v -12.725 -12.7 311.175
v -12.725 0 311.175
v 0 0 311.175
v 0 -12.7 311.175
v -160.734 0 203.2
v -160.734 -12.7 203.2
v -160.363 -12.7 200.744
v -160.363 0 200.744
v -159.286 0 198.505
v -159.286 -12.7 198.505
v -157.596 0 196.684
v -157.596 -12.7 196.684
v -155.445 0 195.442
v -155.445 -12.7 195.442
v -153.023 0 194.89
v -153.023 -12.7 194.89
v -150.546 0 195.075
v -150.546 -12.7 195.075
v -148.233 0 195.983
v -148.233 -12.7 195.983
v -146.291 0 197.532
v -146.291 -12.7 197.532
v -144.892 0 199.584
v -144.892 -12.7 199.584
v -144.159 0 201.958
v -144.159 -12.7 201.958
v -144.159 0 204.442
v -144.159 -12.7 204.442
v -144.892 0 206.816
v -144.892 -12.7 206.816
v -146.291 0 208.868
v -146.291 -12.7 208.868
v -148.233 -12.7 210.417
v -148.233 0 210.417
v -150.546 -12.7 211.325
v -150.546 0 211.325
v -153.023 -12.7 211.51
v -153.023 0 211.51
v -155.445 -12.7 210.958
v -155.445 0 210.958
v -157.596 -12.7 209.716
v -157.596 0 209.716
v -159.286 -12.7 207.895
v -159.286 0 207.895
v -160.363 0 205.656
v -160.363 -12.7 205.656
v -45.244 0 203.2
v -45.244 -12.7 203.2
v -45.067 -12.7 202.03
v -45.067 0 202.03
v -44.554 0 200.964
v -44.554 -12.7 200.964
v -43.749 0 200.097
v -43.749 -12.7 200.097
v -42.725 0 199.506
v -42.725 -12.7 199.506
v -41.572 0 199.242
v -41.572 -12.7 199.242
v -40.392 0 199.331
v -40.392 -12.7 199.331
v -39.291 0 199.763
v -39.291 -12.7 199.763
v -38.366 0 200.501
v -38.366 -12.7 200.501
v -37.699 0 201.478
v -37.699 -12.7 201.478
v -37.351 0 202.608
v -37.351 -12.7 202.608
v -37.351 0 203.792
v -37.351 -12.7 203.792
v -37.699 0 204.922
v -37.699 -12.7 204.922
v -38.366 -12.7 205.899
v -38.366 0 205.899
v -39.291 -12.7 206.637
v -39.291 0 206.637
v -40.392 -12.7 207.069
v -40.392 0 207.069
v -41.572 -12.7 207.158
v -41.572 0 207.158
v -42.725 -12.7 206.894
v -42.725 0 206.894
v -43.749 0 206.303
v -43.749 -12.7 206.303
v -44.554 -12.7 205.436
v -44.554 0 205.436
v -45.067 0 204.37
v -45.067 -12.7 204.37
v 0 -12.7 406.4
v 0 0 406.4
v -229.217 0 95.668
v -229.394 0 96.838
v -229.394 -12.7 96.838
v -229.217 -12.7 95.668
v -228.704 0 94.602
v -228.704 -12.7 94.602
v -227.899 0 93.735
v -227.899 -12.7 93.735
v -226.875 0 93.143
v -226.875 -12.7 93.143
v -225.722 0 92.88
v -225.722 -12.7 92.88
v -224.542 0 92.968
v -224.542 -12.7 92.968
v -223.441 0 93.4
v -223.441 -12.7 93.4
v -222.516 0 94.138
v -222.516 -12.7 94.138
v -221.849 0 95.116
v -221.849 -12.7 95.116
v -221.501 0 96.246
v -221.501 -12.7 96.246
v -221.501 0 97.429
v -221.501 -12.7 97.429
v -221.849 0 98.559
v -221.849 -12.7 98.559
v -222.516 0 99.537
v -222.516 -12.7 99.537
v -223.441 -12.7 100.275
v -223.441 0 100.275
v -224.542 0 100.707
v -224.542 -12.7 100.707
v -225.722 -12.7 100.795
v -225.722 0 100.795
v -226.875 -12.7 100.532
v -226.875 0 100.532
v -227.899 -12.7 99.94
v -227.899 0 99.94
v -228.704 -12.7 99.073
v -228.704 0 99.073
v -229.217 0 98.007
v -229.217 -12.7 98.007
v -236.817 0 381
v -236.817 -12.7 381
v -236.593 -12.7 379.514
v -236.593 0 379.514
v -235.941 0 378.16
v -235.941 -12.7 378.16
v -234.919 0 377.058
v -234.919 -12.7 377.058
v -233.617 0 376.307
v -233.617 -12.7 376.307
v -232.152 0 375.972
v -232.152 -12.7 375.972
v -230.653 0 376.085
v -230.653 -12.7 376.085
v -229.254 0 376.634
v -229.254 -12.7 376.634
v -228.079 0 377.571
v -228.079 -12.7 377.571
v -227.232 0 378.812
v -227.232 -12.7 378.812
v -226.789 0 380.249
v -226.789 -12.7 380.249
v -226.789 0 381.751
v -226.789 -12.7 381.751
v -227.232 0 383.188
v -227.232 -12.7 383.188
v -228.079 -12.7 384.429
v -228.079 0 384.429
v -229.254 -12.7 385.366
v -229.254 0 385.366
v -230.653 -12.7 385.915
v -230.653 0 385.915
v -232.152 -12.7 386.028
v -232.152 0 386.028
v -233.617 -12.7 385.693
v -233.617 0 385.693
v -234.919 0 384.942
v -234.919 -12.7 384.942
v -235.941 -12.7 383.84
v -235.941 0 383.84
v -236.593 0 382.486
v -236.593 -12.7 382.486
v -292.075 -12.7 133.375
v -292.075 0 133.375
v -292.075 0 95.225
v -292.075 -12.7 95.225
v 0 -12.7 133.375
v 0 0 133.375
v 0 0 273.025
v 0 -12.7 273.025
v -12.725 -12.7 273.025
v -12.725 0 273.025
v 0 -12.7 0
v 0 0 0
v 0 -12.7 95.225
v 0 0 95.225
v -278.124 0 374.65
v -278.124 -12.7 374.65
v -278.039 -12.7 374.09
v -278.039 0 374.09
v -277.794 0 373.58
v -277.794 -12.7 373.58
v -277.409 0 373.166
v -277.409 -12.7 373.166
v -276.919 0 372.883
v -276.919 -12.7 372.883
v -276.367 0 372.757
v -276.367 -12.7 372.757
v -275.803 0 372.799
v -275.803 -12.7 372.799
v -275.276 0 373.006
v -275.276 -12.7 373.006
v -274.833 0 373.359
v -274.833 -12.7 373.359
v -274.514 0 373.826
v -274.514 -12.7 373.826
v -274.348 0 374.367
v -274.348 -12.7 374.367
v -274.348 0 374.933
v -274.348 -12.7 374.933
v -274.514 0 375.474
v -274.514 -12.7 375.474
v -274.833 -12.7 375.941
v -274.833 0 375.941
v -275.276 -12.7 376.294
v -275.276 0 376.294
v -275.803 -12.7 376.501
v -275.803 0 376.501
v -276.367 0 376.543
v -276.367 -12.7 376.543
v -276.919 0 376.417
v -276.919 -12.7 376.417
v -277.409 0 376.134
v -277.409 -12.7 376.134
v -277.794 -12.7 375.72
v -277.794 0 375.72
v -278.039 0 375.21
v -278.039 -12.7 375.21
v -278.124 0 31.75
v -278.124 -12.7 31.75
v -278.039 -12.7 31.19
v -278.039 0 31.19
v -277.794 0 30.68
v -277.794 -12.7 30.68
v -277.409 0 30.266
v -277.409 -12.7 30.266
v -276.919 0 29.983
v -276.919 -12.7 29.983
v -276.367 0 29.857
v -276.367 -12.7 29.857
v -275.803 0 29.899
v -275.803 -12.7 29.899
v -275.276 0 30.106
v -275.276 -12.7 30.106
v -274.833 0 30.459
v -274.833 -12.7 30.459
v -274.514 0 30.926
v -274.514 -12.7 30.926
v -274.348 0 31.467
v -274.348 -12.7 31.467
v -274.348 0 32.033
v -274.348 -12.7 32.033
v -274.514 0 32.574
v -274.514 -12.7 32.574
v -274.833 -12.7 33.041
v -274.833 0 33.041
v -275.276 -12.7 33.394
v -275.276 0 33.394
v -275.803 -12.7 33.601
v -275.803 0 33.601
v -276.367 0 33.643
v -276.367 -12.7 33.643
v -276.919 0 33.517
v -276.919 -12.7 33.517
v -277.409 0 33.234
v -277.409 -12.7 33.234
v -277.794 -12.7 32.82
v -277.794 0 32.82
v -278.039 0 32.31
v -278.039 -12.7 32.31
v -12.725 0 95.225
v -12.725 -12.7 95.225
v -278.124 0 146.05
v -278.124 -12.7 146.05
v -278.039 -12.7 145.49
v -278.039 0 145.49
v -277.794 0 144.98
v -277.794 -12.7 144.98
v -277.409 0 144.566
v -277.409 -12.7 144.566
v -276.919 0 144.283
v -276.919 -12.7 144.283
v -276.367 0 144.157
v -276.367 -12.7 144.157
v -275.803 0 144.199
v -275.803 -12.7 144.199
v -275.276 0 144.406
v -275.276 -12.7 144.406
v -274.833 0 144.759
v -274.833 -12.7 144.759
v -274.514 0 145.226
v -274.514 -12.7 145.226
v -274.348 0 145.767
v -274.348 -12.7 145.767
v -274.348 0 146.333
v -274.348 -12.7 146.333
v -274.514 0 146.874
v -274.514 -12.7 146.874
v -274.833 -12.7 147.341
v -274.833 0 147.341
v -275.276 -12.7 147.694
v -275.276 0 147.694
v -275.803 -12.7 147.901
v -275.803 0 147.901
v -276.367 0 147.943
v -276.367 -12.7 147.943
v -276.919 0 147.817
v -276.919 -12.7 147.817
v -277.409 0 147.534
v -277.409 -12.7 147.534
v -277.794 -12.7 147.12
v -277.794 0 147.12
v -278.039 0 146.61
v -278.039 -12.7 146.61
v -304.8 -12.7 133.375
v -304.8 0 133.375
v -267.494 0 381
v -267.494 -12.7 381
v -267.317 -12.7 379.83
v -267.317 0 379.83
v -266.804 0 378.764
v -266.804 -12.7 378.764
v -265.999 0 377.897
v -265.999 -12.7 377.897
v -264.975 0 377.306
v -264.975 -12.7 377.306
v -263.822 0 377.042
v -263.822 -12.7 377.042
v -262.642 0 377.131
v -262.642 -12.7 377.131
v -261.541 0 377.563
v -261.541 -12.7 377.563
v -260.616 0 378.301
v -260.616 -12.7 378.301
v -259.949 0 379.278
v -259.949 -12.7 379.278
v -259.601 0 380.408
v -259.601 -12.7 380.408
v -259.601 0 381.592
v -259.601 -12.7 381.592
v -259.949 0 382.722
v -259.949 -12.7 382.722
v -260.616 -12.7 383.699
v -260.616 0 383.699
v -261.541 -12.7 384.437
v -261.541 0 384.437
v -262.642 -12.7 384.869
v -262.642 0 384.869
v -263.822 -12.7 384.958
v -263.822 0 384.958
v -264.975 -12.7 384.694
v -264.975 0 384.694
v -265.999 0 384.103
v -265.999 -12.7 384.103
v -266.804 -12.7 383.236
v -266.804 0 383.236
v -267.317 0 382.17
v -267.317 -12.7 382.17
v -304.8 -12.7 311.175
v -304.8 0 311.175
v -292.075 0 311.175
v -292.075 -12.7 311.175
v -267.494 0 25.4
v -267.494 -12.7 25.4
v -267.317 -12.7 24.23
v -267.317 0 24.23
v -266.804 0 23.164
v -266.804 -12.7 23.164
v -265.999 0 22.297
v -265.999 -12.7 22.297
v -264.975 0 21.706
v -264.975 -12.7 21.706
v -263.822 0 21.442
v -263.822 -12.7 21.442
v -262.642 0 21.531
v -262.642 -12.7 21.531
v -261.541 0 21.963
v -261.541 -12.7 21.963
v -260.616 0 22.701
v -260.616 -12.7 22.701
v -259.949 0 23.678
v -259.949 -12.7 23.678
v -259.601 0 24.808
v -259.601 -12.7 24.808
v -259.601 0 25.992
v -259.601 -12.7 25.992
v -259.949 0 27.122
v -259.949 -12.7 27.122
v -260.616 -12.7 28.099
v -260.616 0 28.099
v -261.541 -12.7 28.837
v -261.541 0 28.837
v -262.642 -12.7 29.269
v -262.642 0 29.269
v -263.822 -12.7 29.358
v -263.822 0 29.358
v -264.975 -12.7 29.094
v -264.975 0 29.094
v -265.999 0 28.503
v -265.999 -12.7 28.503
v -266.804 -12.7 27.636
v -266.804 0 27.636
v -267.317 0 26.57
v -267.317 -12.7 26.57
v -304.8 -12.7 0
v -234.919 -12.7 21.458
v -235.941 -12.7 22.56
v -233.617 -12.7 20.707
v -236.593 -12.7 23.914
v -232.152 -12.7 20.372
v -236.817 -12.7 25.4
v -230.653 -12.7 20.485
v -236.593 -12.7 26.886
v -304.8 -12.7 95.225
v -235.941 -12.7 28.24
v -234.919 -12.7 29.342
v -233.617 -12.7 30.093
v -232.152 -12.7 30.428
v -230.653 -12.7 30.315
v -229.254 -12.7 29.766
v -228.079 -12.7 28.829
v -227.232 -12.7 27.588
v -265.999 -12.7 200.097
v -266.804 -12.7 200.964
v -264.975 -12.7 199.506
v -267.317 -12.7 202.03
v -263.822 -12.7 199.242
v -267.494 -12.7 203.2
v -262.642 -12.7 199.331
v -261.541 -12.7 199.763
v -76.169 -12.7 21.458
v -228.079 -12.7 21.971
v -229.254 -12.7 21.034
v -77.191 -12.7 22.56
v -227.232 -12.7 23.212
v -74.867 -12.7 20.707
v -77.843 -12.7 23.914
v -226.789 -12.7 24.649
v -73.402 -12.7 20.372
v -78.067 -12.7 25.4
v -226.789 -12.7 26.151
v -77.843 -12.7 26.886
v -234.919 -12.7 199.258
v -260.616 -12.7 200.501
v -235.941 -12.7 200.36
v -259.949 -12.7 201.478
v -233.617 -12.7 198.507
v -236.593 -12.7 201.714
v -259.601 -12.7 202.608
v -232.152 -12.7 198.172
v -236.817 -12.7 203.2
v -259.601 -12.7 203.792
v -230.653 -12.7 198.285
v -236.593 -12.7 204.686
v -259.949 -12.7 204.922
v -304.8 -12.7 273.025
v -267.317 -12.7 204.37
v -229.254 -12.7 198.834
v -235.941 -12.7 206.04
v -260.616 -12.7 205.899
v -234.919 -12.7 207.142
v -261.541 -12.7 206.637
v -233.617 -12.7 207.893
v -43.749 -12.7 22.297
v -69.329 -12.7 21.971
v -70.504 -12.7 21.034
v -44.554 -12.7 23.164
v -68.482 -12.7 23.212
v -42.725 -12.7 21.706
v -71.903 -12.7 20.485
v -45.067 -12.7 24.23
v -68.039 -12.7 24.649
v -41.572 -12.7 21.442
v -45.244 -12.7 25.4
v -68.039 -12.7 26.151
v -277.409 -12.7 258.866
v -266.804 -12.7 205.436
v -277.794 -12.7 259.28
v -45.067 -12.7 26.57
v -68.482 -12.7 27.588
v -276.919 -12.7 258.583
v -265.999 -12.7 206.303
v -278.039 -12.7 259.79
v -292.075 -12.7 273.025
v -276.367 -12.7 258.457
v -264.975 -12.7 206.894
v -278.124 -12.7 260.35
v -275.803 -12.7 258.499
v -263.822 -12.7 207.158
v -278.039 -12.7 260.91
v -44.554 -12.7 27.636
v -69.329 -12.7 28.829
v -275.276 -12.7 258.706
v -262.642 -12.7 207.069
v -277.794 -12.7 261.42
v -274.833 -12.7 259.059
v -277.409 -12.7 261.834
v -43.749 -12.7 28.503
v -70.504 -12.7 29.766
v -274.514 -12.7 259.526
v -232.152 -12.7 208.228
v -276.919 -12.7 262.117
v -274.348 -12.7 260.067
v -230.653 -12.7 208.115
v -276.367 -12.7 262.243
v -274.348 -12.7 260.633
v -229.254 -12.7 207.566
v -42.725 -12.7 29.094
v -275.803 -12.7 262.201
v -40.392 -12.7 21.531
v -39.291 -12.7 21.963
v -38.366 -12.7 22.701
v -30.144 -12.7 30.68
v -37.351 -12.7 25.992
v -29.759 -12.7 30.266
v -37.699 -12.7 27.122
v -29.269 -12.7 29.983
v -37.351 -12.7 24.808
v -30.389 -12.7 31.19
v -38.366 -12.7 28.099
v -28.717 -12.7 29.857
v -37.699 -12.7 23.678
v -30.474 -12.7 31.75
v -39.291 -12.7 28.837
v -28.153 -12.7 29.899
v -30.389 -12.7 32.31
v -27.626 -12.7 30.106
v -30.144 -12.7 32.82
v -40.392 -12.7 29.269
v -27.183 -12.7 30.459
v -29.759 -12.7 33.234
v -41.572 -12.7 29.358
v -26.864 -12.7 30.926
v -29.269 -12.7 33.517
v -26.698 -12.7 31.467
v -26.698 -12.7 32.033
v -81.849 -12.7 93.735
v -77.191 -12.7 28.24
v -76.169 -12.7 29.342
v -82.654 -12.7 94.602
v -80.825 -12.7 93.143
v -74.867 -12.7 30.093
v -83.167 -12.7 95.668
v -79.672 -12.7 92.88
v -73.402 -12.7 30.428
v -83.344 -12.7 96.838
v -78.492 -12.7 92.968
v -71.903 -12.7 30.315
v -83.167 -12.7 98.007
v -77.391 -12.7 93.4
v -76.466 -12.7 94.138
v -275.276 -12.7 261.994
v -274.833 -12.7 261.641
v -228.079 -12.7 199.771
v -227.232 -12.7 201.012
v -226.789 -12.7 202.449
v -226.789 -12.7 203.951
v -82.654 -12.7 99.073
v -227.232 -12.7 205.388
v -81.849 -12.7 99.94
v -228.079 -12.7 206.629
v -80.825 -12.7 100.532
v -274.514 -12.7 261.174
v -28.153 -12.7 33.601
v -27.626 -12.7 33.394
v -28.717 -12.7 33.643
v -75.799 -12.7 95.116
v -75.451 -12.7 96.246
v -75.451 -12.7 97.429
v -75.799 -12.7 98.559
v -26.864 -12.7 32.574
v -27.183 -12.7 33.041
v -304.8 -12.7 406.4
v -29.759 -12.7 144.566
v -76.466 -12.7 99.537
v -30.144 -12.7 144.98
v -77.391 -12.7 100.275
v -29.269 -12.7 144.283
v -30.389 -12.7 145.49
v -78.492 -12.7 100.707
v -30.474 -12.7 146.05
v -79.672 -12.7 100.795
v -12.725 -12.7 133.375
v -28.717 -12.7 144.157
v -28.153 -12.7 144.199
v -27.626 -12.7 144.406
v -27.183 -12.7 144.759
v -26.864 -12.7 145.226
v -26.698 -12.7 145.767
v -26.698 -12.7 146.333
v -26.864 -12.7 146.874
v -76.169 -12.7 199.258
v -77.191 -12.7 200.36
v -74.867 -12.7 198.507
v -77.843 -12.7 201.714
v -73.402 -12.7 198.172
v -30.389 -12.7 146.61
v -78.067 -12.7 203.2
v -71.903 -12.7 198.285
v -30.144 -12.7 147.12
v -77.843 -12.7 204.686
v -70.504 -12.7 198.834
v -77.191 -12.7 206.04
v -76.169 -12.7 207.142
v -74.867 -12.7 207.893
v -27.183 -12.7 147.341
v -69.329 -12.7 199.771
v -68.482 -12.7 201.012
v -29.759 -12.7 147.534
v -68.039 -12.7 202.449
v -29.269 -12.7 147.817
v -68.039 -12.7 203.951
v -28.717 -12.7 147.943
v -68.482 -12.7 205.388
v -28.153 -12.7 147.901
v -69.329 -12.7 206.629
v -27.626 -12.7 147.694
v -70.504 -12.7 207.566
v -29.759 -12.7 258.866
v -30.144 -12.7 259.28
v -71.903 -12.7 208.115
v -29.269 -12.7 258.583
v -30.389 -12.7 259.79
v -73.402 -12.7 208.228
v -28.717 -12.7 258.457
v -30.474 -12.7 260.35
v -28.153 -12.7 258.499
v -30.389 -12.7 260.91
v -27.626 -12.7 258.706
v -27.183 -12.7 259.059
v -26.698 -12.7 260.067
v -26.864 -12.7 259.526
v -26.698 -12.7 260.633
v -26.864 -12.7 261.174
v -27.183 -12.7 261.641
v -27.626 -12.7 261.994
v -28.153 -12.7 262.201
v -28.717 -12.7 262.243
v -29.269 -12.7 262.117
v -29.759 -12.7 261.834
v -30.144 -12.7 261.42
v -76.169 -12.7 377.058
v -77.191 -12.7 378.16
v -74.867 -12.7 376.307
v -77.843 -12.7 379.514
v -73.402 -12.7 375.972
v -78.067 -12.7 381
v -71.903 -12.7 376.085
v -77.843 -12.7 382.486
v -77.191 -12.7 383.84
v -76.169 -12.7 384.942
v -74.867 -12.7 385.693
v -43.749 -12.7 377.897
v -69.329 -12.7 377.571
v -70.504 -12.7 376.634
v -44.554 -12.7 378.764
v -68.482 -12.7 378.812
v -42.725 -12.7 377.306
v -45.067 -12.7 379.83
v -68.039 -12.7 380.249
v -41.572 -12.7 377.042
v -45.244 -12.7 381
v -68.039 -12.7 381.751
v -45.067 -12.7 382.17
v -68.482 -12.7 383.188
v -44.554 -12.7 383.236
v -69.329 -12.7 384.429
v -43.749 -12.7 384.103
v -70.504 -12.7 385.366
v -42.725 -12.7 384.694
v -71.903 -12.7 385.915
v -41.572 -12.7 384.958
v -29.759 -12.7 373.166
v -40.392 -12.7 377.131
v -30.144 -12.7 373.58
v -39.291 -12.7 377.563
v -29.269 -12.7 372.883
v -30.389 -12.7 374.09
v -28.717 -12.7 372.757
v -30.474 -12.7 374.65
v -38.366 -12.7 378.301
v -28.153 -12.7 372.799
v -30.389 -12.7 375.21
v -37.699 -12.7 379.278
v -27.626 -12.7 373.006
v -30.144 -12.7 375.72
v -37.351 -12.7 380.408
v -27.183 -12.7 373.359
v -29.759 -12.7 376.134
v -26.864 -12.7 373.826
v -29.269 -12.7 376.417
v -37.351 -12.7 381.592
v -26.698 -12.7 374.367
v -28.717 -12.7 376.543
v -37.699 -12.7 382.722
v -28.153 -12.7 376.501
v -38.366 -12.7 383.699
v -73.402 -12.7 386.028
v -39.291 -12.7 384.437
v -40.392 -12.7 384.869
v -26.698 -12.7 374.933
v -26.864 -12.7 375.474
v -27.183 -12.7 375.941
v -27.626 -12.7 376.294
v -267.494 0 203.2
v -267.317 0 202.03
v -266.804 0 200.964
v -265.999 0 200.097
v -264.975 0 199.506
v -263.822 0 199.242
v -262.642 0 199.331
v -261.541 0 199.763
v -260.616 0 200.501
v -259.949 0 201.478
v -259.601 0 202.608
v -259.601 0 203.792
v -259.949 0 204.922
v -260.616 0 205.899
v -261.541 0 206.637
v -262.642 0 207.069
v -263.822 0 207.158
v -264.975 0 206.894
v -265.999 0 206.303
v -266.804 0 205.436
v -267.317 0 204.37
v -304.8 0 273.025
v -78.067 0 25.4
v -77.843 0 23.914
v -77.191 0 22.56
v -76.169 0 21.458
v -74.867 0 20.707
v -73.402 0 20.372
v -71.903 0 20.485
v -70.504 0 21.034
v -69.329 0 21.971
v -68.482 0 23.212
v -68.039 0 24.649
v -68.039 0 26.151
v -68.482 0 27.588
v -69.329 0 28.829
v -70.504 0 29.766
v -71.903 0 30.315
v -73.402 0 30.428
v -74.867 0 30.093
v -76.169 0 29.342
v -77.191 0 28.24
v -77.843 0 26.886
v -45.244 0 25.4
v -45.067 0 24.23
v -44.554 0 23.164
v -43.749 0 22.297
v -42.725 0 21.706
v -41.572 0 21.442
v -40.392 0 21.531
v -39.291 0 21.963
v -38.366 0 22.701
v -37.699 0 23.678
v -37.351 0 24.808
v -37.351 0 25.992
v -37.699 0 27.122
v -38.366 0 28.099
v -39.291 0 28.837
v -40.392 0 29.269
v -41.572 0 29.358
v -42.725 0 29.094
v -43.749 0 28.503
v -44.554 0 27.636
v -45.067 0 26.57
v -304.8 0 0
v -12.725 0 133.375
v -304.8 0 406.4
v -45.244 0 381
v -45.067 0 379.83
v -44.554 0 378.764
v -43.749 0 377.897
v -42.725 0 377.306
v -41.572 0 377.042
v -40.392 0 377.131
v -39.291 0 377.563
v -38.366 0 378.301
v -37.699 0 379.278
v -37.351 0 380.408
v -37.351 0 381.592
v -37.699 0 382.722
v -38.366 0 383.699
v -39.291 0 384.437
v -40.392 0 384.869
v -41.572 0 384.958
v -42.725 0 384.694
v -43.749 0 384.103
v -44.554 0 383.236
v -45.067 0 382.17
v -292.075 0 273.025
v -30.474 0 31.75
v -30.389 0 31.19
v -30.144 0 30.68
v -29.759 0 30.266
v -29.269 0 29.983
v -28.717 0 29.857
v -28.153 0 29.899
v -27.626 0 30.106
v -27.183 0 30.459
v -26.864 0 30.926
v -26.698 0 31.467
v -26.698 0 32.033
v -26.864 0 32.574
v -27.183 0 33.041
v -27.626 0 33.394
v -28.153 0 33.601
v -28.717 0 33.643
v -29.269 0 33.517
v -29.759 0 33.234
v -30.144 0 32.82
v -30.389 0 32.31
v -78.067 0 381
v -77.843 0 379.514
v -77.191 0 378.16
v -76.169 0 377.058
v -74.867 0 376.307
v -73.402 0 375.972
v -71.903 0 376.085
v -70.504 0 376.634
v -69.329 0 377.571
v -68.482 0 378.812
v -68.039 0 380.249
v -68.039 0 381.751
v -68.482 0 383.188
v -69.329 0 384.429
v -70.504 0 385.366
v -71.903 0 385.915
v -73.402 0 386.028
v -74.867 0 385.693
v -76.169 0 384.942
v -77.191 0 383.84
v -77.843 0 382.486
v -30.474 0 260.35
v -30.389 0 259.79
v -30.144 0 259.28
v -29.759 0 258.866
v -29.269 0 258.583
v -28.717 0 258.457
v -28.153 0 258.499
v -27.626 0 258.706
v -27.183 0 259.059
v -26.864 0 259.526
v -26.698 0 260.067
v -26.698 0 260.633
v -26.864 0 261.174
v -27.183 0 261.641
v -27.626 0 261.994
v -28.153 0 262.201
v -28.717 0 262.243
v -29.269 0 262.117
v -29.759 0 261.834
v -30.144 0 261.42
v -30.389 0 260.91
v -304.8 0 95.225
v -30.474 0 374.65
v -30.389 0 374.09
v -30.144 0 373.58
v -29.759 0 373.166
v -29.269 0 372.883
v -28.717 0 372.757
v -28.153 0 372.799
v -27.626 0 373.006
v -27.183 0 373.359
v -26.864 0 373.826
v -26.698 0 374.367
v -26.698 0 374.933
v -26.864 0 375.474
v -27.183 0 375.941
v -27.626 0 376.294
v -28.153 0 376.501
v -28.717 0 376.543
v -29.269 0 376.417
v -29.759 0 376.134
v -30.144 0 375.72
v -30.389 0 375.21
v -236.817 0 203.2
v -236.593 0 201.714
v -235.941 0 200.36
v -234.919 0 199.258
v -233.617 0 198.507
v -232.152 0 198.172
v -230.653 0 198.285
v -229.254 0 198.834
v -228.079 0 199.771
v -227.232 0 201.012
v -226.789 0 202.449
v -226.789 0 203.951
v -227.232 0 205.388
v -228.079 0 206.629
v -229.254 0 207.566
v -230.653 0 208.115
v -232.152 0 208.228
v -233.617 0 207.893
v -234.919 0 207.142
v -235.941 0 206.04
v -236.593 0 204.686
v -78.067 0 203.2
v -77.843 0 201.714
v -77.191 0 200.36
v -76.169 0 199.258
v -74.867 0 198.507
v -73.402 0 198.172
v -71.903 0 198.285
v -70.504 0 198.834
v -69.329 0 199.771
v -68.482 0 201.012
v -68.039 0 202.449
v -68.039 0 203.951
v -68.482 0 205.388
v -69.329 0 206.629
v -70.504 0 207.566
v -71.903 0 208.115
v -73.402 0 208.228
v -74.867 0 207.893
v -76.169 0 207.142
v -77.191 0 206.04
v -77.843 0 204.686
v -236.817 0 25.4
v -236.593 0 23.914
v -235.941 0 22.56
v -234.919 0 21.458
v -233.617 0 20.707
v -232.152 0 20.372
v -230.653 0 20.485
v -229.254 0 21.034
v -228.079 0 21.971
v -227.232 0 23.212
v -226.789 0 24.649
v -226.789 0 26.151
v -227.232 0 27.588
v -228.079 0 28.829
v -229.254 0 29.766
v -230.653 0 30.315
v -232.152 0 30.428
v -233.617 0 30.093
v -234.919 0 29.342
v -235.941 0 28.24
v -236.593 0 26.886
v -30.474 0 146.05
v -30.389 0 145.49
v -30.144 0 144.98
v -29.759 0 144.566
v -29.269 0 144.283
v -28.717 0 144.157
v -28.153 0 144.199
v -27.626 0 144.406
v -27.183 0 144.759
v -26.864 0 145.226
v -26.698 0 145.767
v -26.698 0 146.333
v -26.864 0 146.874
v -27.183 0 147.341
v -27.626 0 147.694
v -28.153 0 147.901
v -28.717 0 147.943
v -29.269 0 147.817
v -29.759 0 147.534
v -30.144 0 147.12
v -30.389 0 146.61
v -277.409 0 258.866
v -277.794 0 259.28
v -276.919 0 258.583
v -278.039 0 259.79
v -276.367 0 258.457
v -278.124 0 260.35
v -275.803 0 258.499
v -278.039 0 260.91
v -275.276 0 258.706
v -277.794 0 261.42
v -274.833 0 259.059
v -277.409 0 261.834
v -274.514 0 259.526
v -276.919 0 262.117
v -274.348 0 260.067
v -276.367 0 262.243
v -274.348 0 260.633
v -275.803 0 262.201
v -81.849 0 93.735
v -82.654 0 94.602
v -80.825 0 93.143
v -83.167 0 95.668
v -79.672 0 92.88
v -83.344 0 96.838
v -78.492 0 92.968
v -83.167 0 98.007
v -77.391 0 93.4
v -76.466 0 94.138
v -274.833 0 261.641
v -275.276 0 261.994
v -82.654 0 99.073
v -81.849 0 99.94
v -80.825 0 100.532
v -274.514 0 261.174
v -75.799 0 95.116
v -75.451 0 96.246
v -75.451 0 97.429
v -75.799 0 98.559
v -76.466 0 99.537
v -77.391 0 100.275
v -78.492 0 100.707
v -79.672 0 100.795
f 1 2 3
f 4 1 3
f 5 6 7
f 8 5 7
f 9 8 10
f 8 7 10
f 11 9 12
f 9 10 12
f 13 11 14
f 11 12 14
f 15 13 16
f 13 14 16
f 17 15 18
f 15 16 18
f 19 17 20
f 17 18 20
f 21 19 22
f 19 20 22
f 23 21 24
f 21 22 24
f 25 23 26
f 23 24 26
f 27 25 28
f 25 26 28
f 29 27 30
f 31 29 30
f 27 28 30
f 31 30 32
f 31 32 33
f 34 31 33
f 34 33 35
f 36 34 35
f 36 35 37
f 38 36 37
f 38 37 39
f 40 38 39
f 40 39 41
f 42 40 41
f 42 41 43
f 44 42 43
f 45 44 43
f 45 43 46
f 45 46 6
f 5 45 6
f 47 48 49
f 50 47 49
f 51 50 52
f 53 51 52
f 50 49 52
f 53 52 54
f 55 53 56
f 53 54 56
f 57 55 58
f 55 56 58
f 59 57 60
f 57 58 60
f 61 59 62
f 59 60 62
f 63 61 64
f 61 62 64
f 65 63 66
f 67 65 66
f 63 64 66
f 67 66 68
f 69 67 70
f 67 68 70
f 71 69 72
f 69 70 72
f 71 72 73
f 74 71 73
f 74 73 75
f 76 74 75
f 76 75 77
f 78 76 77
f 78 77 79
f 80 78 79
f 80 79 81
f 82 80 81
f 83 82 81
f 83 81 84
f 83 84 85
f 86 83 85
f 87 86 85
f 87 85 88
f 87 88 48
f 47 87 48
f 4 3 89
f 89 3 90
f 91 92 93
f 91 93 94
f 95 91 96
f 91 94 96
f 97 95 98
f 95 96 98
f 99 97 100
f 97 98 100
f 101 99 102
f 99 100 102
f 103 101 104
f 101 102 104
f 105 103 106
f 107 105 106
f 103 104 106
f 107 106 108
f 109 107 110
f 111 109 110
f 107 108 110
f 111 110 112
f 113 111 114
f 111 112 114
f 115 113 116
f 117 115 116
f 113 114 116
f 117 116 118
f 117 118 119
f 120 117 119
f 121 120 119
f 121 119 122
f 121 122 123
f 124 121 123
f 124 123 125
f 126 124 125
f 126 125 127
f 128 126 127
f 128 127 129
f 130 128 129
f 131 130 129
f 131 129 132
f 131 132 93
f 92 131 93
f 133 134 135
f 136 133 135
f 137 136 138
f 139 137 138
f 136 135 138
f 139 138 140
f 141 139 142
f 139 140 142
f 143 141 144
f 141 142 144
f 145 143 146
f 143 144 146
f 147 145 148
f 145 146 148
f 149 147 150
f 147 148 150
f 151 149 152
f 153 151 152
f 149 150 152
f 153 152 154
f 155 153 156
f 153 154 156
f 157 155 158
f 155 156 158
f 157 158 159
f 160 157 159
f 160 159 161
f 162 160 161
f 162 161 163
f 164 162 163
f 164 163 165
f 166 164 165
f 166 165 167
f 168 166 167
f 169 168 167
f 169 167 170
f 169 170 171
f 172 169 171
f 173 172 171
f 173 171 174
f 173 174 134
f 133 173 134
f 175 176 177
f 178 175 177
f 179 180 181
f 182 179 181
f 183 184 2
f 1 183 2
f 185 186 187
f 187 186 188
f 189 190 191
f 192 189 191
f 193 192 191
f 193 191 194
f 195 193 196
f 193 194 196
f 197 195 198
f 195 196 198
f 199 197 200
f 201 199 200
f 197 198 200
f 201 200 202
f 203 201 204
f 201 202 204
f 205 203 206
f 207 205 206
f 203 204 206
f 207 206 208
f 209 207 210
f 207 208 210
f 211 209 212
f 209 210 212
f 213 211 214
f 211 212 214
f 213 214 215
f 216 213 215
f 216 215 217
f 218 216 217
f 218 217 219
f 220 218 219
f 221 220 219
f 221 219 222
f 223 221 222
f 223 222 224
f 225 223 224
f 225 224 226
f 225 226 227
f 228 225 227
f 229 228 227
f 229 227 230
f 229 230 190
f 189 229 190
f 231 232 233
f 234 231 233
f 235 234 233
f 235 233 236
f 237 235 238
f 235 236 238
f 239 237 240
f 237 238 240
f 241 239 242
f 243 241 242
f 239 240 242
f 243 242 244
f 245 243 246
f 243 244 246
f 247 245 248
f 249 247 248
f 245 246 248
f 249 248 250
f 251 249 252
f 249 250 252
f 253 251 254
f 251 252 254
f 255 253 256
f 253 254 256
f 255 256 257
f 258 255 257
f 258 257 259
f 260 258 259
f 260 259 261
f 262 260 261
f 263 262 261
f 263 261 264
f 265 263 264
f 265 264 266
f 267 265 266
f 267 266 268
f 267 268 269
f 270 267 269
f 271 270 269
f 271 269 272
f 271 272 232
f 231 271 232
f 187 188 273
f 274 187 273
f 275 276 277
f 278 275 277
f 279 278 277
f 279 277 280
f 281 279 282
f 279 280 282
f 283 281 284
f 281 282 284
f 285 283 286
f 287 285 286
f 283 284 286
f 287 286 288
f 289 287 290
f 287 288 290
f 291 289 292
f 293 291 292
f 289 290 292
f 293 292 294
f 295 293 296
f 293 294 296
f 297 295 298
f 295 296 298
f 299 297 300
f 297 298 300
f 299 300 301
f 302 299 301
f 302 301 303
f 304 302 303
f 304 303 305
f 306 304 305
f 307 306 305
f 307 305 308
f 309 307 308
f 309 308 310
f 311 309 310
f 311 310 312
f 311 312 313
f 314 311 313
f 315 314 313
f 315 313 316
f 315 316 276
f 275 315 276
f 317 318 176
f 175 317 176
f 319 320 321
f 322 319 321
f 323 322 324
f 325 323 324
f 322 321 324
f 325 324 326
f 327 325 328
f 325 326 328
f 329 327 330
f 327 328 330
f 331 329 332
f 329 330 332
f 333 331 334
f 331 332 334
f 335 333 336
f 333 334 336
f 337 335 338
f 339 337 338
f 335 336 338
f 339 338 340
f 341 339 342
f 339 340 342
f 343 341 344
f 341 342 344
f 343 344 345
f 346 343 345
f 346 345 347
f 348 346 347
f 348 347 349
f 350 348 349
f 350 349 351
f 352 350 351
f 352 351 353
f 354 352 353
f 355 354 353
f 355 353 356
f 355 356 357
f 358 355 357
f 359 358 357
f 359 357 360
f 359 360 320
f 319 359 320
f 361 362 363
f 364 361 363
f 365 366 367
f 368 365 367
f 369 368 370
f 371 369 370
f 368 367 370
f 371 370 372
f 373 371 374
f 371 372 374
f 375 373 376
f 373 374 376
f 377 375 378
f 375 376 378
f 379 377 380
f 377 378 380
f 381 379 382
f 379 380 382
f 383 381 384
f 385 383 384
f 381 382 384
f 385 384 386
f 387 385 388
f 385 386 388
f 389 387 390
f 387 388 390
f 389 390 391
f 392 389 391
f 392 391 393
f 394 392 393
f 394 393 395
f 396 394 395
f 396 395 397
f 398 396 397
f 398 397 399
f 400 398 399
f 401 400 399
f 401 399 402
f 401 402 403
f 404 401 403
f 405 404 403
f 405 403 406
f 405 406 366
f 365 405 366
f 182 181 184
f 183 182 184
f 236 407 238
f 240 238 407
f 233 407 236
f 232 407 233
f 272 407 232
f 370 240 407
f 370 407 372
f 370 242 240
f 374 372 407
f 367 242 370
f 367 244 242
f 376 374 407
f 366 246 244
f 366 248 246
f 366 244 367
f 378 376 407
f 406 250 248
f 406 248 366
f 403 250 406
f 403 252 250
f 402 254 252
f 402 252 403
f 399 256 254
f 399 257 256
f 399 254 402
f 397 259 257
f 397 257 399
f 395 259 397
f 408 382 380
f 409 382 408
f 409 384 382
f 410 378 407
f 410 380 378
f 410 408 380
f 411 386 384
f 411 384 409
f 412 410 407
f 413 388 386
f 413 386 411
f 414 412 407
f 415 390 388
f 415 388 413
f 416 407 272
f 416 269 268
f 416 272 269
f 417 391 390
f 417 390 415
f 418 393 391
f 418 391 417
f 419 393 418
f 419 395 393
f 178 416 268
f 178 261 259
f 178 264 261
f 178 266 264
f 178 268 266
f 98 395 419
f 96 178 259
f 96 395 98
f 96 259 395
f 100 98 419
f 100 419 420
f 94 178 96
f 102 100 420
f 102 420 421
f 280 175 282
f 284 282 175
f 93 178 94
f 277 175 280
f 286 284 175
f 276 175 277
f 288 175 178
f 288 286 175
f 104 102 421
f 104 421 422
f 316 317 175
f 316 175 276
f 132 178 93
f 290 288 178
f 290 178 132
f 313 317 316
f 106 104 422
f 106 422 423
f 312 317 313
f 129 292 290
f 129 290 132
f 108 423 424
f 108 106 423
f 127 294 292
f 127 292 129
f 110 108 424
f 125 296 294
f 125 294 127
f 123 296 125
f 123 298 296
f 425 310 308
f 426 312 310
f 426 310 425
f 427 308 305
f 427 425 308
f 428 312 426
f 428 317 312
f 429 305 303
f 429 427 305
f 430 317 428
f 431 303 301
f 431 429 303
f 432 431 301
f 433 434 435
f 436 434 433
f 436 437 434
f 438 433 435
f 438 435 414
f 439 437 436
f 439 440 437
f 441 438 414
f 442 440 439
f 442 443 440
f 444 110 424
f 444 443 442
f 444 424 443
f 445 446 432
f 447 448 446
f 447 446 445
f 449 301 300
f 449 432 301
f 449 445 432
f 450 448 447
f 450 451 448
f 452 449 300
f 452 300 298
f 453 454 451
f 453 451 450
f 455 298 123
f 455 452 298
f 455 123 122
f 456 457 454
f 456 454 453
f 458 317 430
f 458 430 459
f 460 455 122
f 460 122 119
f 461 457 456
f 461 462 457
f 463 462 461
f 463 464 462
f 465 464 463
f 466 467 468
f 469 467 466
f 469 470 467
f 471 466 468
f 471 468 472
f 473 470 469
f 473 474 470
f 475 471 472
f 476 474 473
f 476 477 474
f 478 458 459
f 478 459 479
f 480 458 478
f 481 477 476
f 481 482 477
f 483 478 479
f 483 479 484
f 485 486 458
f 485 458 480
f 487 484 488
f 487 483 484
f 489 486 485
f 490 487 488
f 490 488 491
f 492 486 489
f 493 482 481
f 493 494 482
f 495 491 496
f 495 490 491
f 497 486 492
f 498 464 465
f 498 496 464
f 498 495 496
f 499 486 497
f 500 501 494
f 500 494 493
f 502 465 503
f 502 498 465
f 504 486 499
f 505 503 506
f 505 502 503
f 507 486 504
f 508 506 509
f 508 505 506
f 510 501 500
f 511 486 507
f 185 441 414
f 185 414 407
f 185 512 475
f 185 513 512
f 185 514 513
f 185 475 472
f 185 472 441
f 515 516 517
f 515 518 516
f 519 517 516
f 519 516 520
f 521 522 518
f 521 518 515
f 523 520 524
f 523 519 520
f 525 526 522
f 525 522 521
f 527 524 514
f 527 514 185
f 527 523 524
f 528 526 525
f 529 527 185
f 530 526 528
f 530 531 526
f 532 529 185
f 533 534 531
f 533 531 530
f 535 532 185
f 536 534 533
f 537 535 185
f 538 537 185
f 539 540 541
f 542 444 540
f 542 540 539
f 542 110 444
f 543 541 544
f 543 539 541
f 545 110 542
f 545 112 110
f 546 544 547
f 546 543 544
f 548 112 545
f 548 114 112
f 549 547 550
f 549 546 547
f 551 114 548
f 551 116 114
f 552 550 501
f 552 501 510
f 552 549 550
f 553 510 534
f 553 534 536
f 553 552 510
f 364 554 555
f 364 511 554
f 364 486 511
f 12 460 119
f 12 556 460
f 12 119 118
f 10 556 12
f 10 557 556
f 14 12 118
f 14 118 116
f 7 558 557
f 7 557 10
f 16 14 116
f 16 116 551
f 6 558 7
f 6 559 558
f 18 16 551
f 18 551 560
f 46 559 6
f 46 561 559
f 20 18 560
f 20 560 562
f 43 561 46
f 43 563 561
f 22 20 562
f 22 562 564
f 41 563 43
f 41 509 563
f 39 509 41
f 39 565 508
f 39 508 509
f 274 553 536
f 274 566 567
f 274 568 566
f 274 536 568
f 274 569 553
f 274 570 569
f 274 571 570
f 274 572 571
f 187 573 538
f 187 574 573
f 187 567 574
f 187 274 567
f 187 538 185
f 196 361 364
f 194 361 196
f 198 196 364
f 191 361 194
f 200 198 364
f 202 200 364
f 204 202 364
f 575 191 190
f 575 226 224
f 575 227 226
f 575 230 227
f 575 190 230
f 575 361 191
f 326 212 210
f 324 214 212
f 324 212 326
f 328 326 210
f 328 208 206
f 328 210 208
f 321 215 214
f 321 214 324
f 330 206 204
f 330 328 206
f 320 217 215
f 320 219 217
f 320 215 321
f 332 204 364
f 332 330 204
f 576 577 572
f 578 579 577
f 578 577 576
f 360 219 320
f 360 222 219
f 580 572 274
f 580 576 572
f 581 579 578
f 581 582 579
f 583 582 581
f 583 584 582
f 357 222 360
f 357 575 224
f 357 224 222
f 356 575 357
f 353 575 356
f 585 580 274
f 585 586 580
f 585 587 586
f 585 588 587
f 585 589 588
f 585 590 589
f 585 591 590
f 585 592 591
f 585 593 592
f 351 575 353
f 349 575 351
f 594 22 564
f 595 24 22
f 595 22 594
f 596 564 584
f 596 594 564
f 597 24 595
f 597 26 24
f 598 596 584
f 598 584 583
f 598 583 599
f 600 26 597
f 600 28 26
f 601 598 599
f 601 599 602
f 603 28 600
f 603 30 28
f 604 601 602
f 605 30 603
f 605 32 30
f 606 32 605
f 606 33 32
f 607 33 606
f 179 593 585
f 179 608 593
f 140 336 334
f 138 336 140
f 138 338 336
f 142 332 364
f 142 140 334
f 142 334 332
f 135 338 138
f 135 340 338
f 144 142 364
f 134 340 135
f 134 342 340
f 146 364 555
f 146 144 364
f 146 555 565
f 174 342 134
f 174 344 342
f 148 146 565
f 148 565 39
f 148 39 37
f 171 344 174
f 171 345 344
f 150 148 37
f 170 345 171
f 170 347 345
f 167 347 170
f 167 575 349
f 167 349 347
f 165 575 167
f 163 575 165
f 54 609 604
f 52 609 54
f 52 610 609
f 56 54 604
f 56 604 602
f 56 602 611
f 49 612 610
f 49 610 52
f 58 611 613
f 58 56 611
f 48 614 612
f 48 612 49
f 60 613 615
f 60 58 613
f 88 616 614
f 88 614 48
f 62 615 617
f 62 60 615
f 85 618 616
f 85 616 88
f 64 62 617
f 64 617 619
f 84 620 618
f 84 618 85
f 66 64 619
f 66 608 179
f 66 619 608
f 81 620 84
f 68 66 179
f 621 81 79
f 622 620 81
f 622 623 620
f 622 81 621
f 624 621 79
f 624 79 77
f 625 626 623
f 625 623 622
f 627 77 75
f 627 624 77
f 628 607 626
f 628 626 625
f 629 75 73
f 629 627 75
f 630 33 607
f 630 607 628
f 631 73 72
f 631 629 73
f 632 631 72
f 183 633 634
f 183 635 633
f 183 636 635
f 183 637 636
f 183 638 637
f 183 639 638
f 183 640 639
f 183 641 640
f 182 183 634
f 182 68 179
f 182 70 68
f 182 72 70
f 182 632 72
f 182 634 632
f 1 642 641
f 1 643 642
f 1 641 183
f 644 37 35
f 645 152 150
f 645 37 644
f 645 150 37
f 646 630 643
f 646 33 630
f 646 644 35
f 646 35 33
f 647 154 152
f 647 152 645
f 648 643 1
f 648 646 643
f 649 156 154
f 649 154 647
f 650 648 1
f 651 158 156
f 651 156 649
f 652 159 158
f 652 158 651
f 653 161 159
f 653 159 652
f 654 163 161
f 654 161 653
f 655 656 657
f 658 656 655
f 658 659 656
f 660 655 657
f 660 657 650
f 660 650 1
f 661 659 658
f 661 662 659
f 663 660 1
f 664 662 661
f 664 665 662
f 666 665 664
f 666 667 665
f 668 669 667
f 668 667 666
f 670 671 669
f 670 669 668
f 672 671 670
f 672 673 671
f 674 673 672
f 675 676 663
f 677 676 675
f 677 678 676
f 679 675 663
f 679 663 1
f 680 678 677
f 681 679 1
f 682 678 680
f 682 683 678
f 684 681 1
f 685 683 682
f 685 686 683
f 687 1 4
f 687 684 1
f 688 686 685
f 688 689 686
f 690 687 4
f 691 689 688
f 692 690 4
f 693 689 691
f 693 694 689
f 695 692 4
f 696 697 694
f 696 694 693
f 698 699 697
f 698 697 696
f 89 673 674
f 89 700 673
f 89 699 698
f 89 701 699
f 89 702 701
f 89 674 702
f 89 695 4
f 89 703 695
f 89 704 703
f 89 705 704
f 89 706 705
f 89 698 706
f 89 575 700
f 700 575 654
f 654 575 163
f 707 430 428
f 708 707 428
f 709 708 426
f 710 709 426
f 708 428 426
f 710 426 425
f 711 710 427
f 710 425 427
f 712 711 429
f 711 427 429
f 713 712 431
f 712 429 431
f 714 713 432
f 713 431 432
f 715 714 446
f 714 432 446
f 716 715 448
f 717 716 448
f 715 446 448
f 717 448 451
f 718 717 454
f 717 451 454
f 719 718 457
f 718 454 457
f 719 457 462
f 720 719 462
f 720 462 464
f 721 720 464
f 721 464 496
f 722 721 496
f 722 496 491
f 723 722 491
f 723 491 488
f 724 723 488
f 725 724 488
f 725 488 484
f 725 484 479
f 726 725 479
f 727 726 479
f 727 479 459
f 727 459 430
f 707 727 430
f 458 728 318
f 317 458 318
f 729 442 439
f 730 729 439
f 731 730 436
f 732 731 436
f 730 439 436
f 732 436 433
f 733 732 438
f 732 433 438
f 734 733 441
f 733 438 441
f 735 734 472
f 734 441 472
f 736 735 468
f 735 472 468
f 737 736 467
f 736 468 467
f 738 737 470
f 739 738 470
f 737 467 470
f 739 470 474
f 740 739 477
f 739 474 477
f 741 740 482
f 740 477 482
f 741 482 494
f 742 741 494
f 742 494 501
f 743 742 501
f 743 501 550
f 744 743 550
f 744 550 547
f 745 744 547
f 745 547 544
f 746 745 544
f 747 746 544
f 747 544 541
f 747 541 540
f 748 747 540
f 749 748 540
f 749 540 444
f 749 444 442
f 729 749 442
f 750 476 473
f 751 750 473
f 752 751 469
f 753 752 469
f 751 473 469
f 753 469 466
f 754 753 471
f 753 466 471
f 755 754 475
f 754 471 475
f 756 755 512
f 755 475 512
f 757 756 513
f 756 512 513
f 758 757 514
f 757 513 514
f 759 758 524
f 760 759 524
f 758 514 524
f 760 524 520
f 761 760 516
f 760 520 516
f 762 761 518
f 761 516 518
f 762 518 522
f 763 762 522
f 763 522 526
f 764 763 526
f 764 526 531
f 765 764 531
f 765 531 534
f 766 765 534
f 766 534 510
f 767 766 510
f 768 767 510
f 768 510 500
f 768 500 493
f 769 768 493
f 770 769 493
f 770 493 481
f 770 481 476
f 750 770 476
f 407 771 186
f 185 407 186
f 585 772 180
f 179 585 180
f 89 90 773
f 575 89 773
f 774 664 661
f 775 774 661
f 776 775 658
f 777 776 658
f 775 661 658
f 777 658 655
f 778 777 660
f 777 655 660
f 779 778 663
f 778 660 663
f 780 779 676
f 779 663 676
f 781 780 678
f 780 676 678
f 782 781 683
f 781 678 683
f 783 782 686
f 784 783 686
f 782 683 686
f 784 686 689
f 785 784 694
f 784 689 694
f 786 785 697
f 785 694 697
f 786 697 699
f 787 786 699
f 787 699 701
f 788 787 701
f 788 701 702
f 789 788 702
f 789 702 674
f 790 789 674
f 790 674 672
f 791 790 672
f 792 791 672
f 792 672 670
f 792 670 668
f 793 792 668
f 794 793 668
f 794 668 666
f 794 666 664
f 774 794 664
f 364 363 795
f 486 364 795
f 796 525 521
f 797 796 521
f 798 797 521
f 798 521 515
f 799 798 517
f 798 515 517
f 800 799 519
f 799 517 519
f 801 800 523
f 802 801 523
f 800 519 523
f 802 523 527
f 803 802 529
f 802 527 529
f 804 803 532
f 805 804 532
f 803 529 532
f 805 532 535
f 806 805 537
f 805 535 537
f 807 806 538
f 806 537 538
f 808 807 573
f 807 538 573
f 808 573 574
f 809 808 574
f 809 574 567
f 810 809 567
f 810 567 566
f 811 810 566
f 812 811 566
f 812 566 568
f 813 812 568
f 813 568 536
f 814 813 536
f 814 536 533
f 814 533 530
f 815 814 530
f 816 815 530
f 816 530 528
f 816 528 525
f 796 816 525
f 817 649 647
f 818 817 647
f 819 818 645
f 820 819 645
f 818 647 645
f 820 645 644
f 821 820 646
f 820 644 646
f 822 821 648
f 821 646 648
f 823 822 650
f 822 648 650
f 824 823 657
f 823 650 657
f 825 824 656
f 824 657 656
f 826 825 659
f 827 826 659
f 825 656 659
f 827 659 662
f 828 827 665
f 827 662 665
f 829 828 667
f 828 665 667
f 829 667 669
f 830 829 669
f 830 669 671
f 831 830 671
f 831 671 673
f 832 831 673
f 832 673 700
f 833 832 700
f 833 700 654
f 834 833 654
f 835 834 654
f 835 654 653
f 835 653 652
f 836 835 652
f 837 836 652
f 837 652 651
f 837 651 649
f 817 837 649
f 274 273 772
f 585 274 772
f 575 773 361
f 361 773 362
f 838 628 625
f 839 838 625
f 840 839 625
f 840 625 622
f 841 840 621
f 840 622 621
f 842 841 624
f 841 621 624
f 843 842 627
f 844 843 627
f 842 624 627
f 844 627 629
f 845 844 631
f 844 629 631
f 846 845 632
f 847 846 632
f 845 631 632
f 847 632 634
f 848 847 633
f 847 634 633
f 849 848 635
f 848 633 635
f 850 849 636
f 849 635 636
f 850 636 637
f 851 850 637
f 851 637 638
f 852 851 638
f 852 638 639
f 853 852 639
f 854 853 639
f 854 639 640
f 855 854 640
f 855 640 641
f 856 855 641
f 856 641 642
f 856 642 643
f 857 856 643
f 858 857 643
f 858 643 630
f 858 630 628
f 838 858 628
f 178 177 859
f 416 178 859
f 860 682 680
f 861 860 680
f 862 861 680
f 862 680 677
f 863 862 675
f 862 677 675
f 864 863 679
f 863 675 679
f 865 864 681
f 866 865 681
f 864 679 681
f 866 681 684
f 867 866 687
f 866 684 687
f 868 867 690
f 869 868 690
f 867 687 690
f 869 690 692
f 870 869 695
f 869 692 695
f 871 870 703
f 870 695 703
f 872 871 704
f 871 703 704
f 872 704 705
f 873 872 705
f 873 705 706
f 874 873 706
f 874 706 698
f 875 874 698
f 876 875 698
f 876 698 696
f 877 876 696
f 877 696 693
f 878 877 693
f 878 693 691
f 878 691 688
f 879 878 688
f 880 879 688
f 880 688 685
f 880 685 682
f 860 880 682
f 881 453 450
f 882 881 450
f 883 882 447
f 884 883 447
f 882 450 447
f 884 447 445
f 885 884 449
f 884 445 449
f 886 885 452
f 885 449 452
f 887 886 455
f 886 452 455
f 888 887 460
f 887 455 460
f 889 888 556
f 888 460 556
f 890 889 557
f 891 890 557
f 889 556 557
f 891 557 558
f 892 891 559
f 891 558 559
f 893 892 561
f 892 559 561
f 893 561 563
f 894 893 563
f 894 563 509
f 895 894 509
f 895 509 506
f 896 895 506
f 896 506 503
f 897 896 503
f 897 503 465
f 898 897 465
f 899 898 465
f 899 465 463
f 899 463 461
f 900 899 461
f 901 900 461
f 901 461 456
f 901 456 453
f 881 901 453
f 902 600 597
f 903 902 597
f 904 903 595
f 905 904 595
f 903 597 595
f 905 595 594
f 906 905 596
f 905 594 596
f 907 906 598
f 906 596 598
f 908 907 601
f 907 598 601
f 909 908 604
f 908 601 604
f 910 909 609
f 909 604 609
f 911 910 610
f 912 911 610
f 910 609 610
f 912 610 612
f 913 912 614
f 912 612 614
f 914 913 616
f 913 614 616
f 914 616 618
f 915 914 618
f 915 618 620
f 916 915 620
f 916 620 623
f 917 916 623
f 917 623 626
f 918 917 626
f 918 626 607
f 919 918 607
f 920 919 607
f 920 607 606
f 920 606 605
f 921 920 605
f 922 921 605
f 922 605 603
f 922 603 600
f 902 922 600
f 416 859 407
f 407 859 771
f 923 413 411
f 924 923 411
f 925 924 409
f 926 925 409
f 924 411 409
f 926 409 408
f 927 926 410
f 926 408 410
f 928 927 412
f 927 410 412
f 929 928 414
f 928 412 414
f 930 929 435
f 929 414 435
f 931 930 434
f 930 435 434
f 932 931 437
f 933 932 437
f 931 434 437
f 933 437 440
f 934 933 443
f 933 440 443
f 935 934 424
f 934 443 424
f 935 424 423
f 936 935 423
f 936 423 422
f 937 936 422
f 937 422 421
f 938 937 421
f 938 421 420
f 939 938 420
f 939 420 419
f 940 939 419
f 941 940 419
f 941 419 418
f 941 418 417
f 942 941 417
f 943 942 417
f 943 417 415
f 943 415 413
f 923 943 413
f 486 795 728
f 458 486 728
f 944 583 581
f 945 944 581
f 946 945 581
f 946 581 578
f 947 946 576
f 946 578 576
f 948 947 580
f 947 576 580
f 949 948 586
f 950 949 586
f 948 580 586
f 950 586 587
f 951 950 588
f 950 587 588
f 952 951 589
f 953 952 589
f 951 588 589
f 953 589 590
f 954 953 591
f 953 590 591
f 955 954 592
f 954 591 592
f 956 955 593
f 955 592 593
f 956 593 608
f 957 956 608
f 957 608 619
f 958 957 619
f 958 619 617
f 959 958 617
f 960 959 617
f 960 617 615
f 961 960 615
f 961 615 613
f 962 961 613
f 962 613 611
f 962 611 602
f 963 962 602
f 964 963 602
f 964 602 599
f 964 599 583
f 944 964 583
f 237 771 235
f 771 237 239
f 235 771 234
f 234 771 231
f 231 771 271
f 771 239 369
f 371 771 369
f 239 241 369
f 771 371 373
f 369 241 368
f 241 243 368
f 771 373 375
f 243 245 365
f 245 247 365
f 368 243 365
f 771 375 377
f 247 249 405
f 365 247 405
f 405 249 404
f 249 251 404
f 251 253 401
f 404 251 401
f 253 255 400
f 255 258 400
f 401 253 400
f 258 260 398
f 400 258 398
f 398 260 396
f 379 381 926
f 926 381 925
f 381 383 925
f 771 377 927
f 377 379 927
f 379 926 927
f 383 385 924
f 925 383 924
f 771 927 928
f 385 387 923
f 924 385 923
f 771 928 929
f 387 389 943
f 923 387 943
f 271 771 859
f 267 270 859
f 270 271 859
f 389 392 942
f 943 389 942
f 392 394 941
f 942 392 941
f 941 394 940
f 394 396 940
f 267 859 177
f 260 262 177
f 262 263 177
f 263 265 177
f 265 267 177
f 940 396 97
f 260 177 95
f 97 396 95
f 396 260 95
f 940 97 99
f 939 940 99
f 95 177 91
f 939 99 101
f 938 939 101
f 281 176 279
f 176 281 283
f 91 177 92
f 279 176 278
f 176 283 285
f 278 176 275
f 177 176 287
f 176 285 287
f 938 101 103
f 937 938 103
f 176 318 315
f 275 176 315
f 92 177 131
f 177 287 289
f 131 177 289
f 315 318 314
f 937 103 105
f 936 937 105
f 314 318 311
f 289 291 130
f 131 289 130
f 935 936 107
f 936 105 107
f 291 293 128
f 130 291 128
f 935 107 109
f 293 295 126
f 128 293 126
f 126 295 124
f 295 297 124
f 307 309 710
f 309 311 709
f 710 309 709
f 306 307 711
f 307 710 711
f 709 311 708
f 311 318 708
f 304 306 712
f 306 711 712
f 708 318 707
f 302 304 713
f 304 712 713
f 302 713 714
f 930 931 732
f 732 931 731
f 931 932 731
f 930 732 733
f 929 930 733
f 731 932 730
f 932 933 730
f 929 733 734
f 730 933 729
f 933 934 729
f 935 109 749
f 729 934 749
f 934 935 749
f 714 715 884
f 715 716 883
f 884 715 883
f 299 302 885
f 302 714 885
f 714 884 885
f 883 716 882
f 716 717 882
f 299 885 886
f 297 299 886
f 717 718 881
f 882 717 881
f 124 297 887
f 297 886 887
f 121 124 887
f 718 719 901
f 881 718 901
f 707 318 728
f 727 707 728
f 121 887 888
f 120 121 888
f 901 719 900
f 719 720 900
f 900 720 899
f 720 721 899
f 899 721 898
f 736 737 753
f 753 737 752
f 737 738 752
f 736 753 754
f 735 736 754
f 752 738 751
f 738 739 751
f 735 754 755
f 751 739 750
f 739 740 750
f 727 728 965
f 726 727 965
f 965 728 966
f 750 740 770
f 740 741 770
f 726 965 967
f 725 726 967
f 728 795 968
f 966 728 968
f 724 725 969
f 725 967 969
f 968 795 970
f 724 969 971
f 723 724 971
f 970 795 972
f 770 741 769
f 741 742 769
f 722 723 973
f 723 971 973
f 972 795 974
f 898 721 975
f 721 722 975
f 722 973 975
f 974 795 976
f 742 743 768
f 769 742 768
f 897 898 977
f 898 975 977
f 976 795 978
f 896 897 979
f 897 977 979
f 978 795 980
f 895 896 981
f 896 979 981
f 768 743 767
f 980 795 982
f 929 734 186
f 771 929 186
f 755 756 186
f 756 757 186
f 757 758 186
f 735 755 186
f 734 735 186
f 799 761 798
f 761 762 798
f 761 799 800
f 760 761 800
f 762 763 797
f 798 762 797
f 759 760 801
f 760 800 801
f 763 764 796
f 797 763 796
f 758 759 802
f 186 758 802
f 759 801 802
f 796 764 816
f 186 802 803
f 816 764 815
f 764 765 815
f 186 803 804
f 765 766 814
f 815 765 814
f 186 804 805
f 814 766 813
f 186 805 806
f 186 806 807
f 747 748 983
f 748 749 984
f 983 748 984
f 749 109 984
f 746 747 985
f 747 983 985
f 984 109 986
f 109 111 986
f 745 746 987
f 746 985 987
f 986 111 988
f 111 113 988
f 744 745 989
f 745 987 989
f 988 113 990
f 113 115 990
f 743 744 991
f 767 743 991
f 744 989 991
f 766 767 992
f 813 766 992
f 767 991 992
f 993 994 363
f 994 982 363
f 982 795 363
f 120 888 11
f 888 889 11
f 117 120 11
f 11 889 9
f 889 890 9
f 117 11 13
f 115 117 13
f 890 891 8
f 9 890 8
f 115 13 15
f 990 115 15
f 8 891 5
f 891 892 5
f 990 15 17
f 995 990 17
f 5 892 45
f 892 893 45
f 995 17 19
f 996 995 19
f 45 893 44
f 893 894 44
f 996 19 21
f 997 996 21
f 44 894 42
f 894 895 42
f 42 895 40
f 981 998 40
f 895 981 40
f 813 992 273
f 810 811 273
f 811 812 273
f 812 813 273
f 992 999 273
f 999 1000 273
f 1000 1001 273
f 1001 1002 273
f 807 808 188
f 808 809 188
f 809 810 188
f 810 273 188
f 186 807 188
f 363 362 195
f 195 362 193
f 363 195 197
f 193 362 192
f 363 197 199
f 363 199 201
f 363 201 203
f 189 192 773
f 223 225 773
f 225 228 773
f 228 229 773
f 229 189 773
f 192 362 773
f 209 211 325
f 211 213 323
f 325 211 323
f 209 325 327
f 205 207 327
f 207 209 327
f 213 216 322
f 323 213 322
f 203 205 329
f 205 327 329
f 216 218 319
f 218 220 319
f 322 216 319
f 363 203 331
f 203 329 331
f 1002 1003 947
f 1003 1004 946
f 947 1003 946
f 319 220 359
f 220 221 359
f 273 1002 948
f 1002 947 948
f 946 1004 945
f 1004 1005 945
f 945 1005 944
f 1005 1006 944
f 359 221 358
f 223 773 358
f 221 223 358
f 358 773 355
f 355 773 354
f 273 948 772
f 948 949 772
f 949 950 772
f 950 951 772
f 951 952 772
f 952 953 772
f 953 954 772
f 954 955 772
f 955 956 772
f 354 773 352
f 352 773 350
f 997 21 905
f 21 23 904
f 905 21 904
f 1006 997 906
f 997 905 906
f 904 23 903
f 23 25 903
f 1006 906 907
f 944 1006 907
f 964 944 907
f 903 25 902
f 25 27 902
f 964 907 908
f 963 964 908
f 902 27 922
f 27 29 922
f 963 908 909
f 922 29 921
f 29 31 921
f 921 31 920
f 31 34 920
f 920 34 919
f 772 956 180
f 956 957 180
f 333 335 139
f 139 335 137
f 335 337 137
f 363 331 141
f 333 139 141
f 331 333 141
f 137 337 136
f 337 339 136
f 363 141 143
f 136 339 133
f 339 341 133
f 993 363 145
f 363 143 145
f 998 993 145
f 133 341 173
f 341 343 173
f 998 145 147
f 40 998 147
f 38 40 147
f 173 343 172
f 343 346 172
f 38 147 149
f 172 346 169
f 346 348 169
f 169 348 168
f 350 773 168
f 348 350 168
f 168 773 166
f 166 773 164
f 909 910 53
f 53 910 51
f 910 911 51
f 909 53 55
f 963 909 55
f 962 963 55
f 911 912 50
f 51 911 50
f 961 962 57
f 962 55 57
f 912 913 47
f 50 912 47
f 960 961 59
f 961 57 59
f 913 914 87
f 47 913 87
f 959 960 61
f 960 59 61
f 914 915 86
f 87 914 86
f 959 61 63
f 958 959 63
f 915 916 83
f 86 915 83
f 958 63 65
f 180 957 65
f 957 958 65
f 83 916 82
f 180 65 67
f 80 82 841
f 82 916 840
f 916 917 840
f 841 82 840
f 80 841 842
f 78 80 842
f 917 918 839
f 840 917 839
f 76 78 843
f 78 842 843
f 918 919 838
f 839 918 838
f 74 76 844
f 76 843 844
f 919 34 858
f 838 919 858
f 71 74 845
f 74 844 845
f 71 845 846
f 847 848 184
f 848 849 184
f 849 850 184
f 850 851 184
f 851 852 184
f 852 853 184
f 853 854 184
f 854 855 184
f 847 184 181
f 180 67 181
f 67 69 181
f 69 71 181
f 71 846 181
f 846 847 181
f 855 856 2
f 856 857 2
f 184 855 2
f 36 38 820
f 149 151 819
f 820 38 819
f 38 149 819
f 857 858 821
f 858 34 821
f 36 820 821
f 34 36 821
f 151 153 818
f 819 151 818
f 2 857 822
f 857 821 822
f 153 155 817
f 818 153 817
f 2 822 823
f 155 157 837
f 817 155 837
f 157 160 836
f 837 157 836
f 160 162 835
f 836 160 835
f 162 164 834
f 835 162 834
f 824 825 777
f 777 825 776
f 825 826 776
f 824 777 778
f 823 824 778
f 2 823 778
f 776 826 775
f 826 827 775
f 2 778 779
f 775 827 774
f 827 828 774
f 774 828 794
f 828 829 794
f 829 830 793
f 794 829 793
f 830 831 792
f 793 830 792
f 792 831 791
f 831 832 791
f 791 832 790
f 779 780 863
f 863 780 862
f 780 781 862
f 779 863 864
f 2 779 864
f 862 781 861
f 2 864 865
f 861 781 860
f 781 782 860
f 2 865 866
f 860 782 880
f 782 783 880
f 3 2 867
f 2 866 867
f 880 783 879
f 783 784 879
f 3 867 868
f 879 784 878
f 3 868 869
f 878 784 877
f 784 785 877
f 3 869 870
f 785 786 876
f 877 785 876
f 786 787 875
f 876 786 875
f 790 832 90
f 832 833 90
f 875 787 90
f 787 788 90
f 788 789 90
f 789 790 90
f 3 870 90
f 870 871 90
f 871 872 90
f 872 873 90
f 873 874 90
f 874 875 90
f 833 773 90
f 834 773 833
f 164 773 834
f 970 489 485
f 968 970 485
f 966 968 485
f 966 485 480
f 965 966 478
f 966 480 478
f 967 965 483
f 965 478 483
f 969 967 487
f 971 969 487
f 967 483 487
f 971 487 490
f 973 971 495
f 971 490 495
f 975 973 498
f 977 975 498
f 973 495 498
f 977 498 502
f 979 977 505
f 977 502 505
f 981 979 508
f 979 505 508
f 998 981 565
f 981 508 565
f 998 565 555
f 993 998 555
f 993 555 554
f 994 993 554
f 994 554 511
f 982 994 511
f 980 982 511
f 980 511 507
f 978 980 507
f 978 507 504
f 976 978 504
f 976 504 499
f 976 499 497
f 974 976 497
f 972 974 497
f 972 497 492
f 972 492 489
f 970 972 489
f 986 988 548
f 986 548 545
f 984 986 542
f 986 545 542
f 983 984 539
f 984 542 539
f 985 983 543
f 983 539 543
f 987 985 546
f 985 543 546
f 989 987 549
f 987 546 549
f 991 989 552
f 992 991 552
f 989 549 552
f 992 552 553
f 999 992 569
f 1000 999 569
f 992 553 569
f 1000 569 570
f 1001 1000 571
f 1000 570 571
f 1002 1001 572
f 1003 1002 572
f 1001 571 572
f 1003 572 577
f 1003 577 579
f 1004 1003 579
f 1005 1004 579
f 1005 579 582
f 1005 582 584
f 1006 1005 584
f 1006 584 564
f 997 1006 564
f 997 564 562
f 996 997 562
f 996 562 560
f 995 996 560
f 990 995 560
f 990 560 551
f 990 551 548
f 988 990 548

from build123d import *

# Parameters (mm, degrees)
F1_DEPTH = 12.7
F2_D     = 3.7973
F2_DEPTH = 15.8877
F2_TIP   = 1.1408240143
F3_D     = 16.66748
F3_DEPTH = 15.9004
F3_TIP   = 5.0074161752
F4_D     = 7.9375
F4_DEPTH = 17.4879
F4_TIP   = 2.3846655818
F5_D     = 10.0838
F5_DEPTH = 17.5006
F5_TIP   = 3.0294791551
F6_D     = 7.9375
F6_DEPTH = 20.6756
F6_TIP   = 2.3846655818


with BuildPart() as f1:
    # F0 (on Front) → F1 (new body)
    with BuildSketch(Plane.XZ):
        Polygon((-304.8, 0), (0, 0), (0, 95.2246), (-12.7254, 95.2246), (-12.7254, 133.3754), (0, 133.3754), (0, 273.0246), (-12.7254, 273.0246), (-12.7254, 311.1754), (0, 311.1754), (0, 406.4), (-304.8, 406.4), (-304.8, 311.1754), (-292.0746, 311.1754), (-292.0746, 273.0246), (-304.8, 273.0246), (-304.8, 133.3754), (-292.0746, 133.3754), (-292.0746, 95.2246), (-304.8, 95.2246), align=None)
    extrude(amount=F1_DEPTH)

    # F2
    with Locations(Plane(origin=(0, 0, 0), x_dir=(1, 0, 0), z_dir=(0, 1, 0))):
        with Locations((-276.225, -374.65), (-276.225, -260.35), (-276.225, -146.05), (-276.225, -31.75), (-28.575, -374.65), (-28.575, -260.35), (-28.575, -146.05), (-28.575, -31.75)):
            Hole(F2_D / 2, depth=F2_DEPTH)
            with Locations((0, 0, -(F2_DEPTH + F2_TIP / 2))):  # 118° drill point
                Cone(0, F2_D / 2, F2_TIP, mode=Mode.SUBTRACT)

    # F3
    with Locations(Plane(origin=(0, 0, 0), x_dir=(1, 0, 0), z_dir=(0, 1, 0))):
        with Locations((-152.4, -203.2)):
            Hole(F3_D / 2, depth=F3_DEPTH)
            with Locations((0, 0, -(F3_DEPTH + F3_TIP / 2))):  # 118° drill point
                Cone(0, F3_D / 2, F3_TIP, mode=Mode.SUBTRACT)

    # F4
    with Locations(Plane(origin=(0, 0, 0), x_dir=(1, 0, 0), z_dir=(0, 1, 0))):
        with Locations((-263.525, -381), (-263.525, -203.2), (-263.525, -25.4), (-41.275, -381), (-41.275, -203.2), (-41.275, -25.4)):
            Hole(F4_D / 2, depth=F4_DEPTH)
            with Locations((0, 0, -(F4_DEPTH + F4_TIP / 2))):  # 118° drill point
                Cone(0, F4_D / 2, F4_TIP, mode=Mode.SUBTRACT)

    # F5
    with Locations(Plane(origin=(0, 0, 0), x_dir=(1, 0, 0), z_dir=(0, 1, 0))):
        with Locations((-231.775, -381), (-231.775, -203.2), (-231.775, -25.4), (-73.025, -25.4), (-73.025, -203.2), (-73.025, -381)):
            Hole(F5_D / 2, depth=F5_DEPTH)
            with Locations((0, 0, -(F5_DEPTH + F5_TIP / 2))):  # 118° drill point
                Cone(0, F5_D / 2, F5_TIP, mode=Mode.SUBTRACT)

    # F6
    with Locations(Plane(origin=(0, 0, 0), x_dir=(1, 0, 0), z_dir=(0, 1, 0))):
        with Locations((-225.425, -96.8375), (-79.375, -96.8375)):
            Hole(F6_D / 2, depth=F6_DEPTH)
            with Locations((0, 0, -(F6_DEPTH + F6_TIP / 2))):  # 118° drill point
                Cone(0, F6_D / 2, F6_TIP, mode=Mode.SUBTRACT)


solid = f1.part
